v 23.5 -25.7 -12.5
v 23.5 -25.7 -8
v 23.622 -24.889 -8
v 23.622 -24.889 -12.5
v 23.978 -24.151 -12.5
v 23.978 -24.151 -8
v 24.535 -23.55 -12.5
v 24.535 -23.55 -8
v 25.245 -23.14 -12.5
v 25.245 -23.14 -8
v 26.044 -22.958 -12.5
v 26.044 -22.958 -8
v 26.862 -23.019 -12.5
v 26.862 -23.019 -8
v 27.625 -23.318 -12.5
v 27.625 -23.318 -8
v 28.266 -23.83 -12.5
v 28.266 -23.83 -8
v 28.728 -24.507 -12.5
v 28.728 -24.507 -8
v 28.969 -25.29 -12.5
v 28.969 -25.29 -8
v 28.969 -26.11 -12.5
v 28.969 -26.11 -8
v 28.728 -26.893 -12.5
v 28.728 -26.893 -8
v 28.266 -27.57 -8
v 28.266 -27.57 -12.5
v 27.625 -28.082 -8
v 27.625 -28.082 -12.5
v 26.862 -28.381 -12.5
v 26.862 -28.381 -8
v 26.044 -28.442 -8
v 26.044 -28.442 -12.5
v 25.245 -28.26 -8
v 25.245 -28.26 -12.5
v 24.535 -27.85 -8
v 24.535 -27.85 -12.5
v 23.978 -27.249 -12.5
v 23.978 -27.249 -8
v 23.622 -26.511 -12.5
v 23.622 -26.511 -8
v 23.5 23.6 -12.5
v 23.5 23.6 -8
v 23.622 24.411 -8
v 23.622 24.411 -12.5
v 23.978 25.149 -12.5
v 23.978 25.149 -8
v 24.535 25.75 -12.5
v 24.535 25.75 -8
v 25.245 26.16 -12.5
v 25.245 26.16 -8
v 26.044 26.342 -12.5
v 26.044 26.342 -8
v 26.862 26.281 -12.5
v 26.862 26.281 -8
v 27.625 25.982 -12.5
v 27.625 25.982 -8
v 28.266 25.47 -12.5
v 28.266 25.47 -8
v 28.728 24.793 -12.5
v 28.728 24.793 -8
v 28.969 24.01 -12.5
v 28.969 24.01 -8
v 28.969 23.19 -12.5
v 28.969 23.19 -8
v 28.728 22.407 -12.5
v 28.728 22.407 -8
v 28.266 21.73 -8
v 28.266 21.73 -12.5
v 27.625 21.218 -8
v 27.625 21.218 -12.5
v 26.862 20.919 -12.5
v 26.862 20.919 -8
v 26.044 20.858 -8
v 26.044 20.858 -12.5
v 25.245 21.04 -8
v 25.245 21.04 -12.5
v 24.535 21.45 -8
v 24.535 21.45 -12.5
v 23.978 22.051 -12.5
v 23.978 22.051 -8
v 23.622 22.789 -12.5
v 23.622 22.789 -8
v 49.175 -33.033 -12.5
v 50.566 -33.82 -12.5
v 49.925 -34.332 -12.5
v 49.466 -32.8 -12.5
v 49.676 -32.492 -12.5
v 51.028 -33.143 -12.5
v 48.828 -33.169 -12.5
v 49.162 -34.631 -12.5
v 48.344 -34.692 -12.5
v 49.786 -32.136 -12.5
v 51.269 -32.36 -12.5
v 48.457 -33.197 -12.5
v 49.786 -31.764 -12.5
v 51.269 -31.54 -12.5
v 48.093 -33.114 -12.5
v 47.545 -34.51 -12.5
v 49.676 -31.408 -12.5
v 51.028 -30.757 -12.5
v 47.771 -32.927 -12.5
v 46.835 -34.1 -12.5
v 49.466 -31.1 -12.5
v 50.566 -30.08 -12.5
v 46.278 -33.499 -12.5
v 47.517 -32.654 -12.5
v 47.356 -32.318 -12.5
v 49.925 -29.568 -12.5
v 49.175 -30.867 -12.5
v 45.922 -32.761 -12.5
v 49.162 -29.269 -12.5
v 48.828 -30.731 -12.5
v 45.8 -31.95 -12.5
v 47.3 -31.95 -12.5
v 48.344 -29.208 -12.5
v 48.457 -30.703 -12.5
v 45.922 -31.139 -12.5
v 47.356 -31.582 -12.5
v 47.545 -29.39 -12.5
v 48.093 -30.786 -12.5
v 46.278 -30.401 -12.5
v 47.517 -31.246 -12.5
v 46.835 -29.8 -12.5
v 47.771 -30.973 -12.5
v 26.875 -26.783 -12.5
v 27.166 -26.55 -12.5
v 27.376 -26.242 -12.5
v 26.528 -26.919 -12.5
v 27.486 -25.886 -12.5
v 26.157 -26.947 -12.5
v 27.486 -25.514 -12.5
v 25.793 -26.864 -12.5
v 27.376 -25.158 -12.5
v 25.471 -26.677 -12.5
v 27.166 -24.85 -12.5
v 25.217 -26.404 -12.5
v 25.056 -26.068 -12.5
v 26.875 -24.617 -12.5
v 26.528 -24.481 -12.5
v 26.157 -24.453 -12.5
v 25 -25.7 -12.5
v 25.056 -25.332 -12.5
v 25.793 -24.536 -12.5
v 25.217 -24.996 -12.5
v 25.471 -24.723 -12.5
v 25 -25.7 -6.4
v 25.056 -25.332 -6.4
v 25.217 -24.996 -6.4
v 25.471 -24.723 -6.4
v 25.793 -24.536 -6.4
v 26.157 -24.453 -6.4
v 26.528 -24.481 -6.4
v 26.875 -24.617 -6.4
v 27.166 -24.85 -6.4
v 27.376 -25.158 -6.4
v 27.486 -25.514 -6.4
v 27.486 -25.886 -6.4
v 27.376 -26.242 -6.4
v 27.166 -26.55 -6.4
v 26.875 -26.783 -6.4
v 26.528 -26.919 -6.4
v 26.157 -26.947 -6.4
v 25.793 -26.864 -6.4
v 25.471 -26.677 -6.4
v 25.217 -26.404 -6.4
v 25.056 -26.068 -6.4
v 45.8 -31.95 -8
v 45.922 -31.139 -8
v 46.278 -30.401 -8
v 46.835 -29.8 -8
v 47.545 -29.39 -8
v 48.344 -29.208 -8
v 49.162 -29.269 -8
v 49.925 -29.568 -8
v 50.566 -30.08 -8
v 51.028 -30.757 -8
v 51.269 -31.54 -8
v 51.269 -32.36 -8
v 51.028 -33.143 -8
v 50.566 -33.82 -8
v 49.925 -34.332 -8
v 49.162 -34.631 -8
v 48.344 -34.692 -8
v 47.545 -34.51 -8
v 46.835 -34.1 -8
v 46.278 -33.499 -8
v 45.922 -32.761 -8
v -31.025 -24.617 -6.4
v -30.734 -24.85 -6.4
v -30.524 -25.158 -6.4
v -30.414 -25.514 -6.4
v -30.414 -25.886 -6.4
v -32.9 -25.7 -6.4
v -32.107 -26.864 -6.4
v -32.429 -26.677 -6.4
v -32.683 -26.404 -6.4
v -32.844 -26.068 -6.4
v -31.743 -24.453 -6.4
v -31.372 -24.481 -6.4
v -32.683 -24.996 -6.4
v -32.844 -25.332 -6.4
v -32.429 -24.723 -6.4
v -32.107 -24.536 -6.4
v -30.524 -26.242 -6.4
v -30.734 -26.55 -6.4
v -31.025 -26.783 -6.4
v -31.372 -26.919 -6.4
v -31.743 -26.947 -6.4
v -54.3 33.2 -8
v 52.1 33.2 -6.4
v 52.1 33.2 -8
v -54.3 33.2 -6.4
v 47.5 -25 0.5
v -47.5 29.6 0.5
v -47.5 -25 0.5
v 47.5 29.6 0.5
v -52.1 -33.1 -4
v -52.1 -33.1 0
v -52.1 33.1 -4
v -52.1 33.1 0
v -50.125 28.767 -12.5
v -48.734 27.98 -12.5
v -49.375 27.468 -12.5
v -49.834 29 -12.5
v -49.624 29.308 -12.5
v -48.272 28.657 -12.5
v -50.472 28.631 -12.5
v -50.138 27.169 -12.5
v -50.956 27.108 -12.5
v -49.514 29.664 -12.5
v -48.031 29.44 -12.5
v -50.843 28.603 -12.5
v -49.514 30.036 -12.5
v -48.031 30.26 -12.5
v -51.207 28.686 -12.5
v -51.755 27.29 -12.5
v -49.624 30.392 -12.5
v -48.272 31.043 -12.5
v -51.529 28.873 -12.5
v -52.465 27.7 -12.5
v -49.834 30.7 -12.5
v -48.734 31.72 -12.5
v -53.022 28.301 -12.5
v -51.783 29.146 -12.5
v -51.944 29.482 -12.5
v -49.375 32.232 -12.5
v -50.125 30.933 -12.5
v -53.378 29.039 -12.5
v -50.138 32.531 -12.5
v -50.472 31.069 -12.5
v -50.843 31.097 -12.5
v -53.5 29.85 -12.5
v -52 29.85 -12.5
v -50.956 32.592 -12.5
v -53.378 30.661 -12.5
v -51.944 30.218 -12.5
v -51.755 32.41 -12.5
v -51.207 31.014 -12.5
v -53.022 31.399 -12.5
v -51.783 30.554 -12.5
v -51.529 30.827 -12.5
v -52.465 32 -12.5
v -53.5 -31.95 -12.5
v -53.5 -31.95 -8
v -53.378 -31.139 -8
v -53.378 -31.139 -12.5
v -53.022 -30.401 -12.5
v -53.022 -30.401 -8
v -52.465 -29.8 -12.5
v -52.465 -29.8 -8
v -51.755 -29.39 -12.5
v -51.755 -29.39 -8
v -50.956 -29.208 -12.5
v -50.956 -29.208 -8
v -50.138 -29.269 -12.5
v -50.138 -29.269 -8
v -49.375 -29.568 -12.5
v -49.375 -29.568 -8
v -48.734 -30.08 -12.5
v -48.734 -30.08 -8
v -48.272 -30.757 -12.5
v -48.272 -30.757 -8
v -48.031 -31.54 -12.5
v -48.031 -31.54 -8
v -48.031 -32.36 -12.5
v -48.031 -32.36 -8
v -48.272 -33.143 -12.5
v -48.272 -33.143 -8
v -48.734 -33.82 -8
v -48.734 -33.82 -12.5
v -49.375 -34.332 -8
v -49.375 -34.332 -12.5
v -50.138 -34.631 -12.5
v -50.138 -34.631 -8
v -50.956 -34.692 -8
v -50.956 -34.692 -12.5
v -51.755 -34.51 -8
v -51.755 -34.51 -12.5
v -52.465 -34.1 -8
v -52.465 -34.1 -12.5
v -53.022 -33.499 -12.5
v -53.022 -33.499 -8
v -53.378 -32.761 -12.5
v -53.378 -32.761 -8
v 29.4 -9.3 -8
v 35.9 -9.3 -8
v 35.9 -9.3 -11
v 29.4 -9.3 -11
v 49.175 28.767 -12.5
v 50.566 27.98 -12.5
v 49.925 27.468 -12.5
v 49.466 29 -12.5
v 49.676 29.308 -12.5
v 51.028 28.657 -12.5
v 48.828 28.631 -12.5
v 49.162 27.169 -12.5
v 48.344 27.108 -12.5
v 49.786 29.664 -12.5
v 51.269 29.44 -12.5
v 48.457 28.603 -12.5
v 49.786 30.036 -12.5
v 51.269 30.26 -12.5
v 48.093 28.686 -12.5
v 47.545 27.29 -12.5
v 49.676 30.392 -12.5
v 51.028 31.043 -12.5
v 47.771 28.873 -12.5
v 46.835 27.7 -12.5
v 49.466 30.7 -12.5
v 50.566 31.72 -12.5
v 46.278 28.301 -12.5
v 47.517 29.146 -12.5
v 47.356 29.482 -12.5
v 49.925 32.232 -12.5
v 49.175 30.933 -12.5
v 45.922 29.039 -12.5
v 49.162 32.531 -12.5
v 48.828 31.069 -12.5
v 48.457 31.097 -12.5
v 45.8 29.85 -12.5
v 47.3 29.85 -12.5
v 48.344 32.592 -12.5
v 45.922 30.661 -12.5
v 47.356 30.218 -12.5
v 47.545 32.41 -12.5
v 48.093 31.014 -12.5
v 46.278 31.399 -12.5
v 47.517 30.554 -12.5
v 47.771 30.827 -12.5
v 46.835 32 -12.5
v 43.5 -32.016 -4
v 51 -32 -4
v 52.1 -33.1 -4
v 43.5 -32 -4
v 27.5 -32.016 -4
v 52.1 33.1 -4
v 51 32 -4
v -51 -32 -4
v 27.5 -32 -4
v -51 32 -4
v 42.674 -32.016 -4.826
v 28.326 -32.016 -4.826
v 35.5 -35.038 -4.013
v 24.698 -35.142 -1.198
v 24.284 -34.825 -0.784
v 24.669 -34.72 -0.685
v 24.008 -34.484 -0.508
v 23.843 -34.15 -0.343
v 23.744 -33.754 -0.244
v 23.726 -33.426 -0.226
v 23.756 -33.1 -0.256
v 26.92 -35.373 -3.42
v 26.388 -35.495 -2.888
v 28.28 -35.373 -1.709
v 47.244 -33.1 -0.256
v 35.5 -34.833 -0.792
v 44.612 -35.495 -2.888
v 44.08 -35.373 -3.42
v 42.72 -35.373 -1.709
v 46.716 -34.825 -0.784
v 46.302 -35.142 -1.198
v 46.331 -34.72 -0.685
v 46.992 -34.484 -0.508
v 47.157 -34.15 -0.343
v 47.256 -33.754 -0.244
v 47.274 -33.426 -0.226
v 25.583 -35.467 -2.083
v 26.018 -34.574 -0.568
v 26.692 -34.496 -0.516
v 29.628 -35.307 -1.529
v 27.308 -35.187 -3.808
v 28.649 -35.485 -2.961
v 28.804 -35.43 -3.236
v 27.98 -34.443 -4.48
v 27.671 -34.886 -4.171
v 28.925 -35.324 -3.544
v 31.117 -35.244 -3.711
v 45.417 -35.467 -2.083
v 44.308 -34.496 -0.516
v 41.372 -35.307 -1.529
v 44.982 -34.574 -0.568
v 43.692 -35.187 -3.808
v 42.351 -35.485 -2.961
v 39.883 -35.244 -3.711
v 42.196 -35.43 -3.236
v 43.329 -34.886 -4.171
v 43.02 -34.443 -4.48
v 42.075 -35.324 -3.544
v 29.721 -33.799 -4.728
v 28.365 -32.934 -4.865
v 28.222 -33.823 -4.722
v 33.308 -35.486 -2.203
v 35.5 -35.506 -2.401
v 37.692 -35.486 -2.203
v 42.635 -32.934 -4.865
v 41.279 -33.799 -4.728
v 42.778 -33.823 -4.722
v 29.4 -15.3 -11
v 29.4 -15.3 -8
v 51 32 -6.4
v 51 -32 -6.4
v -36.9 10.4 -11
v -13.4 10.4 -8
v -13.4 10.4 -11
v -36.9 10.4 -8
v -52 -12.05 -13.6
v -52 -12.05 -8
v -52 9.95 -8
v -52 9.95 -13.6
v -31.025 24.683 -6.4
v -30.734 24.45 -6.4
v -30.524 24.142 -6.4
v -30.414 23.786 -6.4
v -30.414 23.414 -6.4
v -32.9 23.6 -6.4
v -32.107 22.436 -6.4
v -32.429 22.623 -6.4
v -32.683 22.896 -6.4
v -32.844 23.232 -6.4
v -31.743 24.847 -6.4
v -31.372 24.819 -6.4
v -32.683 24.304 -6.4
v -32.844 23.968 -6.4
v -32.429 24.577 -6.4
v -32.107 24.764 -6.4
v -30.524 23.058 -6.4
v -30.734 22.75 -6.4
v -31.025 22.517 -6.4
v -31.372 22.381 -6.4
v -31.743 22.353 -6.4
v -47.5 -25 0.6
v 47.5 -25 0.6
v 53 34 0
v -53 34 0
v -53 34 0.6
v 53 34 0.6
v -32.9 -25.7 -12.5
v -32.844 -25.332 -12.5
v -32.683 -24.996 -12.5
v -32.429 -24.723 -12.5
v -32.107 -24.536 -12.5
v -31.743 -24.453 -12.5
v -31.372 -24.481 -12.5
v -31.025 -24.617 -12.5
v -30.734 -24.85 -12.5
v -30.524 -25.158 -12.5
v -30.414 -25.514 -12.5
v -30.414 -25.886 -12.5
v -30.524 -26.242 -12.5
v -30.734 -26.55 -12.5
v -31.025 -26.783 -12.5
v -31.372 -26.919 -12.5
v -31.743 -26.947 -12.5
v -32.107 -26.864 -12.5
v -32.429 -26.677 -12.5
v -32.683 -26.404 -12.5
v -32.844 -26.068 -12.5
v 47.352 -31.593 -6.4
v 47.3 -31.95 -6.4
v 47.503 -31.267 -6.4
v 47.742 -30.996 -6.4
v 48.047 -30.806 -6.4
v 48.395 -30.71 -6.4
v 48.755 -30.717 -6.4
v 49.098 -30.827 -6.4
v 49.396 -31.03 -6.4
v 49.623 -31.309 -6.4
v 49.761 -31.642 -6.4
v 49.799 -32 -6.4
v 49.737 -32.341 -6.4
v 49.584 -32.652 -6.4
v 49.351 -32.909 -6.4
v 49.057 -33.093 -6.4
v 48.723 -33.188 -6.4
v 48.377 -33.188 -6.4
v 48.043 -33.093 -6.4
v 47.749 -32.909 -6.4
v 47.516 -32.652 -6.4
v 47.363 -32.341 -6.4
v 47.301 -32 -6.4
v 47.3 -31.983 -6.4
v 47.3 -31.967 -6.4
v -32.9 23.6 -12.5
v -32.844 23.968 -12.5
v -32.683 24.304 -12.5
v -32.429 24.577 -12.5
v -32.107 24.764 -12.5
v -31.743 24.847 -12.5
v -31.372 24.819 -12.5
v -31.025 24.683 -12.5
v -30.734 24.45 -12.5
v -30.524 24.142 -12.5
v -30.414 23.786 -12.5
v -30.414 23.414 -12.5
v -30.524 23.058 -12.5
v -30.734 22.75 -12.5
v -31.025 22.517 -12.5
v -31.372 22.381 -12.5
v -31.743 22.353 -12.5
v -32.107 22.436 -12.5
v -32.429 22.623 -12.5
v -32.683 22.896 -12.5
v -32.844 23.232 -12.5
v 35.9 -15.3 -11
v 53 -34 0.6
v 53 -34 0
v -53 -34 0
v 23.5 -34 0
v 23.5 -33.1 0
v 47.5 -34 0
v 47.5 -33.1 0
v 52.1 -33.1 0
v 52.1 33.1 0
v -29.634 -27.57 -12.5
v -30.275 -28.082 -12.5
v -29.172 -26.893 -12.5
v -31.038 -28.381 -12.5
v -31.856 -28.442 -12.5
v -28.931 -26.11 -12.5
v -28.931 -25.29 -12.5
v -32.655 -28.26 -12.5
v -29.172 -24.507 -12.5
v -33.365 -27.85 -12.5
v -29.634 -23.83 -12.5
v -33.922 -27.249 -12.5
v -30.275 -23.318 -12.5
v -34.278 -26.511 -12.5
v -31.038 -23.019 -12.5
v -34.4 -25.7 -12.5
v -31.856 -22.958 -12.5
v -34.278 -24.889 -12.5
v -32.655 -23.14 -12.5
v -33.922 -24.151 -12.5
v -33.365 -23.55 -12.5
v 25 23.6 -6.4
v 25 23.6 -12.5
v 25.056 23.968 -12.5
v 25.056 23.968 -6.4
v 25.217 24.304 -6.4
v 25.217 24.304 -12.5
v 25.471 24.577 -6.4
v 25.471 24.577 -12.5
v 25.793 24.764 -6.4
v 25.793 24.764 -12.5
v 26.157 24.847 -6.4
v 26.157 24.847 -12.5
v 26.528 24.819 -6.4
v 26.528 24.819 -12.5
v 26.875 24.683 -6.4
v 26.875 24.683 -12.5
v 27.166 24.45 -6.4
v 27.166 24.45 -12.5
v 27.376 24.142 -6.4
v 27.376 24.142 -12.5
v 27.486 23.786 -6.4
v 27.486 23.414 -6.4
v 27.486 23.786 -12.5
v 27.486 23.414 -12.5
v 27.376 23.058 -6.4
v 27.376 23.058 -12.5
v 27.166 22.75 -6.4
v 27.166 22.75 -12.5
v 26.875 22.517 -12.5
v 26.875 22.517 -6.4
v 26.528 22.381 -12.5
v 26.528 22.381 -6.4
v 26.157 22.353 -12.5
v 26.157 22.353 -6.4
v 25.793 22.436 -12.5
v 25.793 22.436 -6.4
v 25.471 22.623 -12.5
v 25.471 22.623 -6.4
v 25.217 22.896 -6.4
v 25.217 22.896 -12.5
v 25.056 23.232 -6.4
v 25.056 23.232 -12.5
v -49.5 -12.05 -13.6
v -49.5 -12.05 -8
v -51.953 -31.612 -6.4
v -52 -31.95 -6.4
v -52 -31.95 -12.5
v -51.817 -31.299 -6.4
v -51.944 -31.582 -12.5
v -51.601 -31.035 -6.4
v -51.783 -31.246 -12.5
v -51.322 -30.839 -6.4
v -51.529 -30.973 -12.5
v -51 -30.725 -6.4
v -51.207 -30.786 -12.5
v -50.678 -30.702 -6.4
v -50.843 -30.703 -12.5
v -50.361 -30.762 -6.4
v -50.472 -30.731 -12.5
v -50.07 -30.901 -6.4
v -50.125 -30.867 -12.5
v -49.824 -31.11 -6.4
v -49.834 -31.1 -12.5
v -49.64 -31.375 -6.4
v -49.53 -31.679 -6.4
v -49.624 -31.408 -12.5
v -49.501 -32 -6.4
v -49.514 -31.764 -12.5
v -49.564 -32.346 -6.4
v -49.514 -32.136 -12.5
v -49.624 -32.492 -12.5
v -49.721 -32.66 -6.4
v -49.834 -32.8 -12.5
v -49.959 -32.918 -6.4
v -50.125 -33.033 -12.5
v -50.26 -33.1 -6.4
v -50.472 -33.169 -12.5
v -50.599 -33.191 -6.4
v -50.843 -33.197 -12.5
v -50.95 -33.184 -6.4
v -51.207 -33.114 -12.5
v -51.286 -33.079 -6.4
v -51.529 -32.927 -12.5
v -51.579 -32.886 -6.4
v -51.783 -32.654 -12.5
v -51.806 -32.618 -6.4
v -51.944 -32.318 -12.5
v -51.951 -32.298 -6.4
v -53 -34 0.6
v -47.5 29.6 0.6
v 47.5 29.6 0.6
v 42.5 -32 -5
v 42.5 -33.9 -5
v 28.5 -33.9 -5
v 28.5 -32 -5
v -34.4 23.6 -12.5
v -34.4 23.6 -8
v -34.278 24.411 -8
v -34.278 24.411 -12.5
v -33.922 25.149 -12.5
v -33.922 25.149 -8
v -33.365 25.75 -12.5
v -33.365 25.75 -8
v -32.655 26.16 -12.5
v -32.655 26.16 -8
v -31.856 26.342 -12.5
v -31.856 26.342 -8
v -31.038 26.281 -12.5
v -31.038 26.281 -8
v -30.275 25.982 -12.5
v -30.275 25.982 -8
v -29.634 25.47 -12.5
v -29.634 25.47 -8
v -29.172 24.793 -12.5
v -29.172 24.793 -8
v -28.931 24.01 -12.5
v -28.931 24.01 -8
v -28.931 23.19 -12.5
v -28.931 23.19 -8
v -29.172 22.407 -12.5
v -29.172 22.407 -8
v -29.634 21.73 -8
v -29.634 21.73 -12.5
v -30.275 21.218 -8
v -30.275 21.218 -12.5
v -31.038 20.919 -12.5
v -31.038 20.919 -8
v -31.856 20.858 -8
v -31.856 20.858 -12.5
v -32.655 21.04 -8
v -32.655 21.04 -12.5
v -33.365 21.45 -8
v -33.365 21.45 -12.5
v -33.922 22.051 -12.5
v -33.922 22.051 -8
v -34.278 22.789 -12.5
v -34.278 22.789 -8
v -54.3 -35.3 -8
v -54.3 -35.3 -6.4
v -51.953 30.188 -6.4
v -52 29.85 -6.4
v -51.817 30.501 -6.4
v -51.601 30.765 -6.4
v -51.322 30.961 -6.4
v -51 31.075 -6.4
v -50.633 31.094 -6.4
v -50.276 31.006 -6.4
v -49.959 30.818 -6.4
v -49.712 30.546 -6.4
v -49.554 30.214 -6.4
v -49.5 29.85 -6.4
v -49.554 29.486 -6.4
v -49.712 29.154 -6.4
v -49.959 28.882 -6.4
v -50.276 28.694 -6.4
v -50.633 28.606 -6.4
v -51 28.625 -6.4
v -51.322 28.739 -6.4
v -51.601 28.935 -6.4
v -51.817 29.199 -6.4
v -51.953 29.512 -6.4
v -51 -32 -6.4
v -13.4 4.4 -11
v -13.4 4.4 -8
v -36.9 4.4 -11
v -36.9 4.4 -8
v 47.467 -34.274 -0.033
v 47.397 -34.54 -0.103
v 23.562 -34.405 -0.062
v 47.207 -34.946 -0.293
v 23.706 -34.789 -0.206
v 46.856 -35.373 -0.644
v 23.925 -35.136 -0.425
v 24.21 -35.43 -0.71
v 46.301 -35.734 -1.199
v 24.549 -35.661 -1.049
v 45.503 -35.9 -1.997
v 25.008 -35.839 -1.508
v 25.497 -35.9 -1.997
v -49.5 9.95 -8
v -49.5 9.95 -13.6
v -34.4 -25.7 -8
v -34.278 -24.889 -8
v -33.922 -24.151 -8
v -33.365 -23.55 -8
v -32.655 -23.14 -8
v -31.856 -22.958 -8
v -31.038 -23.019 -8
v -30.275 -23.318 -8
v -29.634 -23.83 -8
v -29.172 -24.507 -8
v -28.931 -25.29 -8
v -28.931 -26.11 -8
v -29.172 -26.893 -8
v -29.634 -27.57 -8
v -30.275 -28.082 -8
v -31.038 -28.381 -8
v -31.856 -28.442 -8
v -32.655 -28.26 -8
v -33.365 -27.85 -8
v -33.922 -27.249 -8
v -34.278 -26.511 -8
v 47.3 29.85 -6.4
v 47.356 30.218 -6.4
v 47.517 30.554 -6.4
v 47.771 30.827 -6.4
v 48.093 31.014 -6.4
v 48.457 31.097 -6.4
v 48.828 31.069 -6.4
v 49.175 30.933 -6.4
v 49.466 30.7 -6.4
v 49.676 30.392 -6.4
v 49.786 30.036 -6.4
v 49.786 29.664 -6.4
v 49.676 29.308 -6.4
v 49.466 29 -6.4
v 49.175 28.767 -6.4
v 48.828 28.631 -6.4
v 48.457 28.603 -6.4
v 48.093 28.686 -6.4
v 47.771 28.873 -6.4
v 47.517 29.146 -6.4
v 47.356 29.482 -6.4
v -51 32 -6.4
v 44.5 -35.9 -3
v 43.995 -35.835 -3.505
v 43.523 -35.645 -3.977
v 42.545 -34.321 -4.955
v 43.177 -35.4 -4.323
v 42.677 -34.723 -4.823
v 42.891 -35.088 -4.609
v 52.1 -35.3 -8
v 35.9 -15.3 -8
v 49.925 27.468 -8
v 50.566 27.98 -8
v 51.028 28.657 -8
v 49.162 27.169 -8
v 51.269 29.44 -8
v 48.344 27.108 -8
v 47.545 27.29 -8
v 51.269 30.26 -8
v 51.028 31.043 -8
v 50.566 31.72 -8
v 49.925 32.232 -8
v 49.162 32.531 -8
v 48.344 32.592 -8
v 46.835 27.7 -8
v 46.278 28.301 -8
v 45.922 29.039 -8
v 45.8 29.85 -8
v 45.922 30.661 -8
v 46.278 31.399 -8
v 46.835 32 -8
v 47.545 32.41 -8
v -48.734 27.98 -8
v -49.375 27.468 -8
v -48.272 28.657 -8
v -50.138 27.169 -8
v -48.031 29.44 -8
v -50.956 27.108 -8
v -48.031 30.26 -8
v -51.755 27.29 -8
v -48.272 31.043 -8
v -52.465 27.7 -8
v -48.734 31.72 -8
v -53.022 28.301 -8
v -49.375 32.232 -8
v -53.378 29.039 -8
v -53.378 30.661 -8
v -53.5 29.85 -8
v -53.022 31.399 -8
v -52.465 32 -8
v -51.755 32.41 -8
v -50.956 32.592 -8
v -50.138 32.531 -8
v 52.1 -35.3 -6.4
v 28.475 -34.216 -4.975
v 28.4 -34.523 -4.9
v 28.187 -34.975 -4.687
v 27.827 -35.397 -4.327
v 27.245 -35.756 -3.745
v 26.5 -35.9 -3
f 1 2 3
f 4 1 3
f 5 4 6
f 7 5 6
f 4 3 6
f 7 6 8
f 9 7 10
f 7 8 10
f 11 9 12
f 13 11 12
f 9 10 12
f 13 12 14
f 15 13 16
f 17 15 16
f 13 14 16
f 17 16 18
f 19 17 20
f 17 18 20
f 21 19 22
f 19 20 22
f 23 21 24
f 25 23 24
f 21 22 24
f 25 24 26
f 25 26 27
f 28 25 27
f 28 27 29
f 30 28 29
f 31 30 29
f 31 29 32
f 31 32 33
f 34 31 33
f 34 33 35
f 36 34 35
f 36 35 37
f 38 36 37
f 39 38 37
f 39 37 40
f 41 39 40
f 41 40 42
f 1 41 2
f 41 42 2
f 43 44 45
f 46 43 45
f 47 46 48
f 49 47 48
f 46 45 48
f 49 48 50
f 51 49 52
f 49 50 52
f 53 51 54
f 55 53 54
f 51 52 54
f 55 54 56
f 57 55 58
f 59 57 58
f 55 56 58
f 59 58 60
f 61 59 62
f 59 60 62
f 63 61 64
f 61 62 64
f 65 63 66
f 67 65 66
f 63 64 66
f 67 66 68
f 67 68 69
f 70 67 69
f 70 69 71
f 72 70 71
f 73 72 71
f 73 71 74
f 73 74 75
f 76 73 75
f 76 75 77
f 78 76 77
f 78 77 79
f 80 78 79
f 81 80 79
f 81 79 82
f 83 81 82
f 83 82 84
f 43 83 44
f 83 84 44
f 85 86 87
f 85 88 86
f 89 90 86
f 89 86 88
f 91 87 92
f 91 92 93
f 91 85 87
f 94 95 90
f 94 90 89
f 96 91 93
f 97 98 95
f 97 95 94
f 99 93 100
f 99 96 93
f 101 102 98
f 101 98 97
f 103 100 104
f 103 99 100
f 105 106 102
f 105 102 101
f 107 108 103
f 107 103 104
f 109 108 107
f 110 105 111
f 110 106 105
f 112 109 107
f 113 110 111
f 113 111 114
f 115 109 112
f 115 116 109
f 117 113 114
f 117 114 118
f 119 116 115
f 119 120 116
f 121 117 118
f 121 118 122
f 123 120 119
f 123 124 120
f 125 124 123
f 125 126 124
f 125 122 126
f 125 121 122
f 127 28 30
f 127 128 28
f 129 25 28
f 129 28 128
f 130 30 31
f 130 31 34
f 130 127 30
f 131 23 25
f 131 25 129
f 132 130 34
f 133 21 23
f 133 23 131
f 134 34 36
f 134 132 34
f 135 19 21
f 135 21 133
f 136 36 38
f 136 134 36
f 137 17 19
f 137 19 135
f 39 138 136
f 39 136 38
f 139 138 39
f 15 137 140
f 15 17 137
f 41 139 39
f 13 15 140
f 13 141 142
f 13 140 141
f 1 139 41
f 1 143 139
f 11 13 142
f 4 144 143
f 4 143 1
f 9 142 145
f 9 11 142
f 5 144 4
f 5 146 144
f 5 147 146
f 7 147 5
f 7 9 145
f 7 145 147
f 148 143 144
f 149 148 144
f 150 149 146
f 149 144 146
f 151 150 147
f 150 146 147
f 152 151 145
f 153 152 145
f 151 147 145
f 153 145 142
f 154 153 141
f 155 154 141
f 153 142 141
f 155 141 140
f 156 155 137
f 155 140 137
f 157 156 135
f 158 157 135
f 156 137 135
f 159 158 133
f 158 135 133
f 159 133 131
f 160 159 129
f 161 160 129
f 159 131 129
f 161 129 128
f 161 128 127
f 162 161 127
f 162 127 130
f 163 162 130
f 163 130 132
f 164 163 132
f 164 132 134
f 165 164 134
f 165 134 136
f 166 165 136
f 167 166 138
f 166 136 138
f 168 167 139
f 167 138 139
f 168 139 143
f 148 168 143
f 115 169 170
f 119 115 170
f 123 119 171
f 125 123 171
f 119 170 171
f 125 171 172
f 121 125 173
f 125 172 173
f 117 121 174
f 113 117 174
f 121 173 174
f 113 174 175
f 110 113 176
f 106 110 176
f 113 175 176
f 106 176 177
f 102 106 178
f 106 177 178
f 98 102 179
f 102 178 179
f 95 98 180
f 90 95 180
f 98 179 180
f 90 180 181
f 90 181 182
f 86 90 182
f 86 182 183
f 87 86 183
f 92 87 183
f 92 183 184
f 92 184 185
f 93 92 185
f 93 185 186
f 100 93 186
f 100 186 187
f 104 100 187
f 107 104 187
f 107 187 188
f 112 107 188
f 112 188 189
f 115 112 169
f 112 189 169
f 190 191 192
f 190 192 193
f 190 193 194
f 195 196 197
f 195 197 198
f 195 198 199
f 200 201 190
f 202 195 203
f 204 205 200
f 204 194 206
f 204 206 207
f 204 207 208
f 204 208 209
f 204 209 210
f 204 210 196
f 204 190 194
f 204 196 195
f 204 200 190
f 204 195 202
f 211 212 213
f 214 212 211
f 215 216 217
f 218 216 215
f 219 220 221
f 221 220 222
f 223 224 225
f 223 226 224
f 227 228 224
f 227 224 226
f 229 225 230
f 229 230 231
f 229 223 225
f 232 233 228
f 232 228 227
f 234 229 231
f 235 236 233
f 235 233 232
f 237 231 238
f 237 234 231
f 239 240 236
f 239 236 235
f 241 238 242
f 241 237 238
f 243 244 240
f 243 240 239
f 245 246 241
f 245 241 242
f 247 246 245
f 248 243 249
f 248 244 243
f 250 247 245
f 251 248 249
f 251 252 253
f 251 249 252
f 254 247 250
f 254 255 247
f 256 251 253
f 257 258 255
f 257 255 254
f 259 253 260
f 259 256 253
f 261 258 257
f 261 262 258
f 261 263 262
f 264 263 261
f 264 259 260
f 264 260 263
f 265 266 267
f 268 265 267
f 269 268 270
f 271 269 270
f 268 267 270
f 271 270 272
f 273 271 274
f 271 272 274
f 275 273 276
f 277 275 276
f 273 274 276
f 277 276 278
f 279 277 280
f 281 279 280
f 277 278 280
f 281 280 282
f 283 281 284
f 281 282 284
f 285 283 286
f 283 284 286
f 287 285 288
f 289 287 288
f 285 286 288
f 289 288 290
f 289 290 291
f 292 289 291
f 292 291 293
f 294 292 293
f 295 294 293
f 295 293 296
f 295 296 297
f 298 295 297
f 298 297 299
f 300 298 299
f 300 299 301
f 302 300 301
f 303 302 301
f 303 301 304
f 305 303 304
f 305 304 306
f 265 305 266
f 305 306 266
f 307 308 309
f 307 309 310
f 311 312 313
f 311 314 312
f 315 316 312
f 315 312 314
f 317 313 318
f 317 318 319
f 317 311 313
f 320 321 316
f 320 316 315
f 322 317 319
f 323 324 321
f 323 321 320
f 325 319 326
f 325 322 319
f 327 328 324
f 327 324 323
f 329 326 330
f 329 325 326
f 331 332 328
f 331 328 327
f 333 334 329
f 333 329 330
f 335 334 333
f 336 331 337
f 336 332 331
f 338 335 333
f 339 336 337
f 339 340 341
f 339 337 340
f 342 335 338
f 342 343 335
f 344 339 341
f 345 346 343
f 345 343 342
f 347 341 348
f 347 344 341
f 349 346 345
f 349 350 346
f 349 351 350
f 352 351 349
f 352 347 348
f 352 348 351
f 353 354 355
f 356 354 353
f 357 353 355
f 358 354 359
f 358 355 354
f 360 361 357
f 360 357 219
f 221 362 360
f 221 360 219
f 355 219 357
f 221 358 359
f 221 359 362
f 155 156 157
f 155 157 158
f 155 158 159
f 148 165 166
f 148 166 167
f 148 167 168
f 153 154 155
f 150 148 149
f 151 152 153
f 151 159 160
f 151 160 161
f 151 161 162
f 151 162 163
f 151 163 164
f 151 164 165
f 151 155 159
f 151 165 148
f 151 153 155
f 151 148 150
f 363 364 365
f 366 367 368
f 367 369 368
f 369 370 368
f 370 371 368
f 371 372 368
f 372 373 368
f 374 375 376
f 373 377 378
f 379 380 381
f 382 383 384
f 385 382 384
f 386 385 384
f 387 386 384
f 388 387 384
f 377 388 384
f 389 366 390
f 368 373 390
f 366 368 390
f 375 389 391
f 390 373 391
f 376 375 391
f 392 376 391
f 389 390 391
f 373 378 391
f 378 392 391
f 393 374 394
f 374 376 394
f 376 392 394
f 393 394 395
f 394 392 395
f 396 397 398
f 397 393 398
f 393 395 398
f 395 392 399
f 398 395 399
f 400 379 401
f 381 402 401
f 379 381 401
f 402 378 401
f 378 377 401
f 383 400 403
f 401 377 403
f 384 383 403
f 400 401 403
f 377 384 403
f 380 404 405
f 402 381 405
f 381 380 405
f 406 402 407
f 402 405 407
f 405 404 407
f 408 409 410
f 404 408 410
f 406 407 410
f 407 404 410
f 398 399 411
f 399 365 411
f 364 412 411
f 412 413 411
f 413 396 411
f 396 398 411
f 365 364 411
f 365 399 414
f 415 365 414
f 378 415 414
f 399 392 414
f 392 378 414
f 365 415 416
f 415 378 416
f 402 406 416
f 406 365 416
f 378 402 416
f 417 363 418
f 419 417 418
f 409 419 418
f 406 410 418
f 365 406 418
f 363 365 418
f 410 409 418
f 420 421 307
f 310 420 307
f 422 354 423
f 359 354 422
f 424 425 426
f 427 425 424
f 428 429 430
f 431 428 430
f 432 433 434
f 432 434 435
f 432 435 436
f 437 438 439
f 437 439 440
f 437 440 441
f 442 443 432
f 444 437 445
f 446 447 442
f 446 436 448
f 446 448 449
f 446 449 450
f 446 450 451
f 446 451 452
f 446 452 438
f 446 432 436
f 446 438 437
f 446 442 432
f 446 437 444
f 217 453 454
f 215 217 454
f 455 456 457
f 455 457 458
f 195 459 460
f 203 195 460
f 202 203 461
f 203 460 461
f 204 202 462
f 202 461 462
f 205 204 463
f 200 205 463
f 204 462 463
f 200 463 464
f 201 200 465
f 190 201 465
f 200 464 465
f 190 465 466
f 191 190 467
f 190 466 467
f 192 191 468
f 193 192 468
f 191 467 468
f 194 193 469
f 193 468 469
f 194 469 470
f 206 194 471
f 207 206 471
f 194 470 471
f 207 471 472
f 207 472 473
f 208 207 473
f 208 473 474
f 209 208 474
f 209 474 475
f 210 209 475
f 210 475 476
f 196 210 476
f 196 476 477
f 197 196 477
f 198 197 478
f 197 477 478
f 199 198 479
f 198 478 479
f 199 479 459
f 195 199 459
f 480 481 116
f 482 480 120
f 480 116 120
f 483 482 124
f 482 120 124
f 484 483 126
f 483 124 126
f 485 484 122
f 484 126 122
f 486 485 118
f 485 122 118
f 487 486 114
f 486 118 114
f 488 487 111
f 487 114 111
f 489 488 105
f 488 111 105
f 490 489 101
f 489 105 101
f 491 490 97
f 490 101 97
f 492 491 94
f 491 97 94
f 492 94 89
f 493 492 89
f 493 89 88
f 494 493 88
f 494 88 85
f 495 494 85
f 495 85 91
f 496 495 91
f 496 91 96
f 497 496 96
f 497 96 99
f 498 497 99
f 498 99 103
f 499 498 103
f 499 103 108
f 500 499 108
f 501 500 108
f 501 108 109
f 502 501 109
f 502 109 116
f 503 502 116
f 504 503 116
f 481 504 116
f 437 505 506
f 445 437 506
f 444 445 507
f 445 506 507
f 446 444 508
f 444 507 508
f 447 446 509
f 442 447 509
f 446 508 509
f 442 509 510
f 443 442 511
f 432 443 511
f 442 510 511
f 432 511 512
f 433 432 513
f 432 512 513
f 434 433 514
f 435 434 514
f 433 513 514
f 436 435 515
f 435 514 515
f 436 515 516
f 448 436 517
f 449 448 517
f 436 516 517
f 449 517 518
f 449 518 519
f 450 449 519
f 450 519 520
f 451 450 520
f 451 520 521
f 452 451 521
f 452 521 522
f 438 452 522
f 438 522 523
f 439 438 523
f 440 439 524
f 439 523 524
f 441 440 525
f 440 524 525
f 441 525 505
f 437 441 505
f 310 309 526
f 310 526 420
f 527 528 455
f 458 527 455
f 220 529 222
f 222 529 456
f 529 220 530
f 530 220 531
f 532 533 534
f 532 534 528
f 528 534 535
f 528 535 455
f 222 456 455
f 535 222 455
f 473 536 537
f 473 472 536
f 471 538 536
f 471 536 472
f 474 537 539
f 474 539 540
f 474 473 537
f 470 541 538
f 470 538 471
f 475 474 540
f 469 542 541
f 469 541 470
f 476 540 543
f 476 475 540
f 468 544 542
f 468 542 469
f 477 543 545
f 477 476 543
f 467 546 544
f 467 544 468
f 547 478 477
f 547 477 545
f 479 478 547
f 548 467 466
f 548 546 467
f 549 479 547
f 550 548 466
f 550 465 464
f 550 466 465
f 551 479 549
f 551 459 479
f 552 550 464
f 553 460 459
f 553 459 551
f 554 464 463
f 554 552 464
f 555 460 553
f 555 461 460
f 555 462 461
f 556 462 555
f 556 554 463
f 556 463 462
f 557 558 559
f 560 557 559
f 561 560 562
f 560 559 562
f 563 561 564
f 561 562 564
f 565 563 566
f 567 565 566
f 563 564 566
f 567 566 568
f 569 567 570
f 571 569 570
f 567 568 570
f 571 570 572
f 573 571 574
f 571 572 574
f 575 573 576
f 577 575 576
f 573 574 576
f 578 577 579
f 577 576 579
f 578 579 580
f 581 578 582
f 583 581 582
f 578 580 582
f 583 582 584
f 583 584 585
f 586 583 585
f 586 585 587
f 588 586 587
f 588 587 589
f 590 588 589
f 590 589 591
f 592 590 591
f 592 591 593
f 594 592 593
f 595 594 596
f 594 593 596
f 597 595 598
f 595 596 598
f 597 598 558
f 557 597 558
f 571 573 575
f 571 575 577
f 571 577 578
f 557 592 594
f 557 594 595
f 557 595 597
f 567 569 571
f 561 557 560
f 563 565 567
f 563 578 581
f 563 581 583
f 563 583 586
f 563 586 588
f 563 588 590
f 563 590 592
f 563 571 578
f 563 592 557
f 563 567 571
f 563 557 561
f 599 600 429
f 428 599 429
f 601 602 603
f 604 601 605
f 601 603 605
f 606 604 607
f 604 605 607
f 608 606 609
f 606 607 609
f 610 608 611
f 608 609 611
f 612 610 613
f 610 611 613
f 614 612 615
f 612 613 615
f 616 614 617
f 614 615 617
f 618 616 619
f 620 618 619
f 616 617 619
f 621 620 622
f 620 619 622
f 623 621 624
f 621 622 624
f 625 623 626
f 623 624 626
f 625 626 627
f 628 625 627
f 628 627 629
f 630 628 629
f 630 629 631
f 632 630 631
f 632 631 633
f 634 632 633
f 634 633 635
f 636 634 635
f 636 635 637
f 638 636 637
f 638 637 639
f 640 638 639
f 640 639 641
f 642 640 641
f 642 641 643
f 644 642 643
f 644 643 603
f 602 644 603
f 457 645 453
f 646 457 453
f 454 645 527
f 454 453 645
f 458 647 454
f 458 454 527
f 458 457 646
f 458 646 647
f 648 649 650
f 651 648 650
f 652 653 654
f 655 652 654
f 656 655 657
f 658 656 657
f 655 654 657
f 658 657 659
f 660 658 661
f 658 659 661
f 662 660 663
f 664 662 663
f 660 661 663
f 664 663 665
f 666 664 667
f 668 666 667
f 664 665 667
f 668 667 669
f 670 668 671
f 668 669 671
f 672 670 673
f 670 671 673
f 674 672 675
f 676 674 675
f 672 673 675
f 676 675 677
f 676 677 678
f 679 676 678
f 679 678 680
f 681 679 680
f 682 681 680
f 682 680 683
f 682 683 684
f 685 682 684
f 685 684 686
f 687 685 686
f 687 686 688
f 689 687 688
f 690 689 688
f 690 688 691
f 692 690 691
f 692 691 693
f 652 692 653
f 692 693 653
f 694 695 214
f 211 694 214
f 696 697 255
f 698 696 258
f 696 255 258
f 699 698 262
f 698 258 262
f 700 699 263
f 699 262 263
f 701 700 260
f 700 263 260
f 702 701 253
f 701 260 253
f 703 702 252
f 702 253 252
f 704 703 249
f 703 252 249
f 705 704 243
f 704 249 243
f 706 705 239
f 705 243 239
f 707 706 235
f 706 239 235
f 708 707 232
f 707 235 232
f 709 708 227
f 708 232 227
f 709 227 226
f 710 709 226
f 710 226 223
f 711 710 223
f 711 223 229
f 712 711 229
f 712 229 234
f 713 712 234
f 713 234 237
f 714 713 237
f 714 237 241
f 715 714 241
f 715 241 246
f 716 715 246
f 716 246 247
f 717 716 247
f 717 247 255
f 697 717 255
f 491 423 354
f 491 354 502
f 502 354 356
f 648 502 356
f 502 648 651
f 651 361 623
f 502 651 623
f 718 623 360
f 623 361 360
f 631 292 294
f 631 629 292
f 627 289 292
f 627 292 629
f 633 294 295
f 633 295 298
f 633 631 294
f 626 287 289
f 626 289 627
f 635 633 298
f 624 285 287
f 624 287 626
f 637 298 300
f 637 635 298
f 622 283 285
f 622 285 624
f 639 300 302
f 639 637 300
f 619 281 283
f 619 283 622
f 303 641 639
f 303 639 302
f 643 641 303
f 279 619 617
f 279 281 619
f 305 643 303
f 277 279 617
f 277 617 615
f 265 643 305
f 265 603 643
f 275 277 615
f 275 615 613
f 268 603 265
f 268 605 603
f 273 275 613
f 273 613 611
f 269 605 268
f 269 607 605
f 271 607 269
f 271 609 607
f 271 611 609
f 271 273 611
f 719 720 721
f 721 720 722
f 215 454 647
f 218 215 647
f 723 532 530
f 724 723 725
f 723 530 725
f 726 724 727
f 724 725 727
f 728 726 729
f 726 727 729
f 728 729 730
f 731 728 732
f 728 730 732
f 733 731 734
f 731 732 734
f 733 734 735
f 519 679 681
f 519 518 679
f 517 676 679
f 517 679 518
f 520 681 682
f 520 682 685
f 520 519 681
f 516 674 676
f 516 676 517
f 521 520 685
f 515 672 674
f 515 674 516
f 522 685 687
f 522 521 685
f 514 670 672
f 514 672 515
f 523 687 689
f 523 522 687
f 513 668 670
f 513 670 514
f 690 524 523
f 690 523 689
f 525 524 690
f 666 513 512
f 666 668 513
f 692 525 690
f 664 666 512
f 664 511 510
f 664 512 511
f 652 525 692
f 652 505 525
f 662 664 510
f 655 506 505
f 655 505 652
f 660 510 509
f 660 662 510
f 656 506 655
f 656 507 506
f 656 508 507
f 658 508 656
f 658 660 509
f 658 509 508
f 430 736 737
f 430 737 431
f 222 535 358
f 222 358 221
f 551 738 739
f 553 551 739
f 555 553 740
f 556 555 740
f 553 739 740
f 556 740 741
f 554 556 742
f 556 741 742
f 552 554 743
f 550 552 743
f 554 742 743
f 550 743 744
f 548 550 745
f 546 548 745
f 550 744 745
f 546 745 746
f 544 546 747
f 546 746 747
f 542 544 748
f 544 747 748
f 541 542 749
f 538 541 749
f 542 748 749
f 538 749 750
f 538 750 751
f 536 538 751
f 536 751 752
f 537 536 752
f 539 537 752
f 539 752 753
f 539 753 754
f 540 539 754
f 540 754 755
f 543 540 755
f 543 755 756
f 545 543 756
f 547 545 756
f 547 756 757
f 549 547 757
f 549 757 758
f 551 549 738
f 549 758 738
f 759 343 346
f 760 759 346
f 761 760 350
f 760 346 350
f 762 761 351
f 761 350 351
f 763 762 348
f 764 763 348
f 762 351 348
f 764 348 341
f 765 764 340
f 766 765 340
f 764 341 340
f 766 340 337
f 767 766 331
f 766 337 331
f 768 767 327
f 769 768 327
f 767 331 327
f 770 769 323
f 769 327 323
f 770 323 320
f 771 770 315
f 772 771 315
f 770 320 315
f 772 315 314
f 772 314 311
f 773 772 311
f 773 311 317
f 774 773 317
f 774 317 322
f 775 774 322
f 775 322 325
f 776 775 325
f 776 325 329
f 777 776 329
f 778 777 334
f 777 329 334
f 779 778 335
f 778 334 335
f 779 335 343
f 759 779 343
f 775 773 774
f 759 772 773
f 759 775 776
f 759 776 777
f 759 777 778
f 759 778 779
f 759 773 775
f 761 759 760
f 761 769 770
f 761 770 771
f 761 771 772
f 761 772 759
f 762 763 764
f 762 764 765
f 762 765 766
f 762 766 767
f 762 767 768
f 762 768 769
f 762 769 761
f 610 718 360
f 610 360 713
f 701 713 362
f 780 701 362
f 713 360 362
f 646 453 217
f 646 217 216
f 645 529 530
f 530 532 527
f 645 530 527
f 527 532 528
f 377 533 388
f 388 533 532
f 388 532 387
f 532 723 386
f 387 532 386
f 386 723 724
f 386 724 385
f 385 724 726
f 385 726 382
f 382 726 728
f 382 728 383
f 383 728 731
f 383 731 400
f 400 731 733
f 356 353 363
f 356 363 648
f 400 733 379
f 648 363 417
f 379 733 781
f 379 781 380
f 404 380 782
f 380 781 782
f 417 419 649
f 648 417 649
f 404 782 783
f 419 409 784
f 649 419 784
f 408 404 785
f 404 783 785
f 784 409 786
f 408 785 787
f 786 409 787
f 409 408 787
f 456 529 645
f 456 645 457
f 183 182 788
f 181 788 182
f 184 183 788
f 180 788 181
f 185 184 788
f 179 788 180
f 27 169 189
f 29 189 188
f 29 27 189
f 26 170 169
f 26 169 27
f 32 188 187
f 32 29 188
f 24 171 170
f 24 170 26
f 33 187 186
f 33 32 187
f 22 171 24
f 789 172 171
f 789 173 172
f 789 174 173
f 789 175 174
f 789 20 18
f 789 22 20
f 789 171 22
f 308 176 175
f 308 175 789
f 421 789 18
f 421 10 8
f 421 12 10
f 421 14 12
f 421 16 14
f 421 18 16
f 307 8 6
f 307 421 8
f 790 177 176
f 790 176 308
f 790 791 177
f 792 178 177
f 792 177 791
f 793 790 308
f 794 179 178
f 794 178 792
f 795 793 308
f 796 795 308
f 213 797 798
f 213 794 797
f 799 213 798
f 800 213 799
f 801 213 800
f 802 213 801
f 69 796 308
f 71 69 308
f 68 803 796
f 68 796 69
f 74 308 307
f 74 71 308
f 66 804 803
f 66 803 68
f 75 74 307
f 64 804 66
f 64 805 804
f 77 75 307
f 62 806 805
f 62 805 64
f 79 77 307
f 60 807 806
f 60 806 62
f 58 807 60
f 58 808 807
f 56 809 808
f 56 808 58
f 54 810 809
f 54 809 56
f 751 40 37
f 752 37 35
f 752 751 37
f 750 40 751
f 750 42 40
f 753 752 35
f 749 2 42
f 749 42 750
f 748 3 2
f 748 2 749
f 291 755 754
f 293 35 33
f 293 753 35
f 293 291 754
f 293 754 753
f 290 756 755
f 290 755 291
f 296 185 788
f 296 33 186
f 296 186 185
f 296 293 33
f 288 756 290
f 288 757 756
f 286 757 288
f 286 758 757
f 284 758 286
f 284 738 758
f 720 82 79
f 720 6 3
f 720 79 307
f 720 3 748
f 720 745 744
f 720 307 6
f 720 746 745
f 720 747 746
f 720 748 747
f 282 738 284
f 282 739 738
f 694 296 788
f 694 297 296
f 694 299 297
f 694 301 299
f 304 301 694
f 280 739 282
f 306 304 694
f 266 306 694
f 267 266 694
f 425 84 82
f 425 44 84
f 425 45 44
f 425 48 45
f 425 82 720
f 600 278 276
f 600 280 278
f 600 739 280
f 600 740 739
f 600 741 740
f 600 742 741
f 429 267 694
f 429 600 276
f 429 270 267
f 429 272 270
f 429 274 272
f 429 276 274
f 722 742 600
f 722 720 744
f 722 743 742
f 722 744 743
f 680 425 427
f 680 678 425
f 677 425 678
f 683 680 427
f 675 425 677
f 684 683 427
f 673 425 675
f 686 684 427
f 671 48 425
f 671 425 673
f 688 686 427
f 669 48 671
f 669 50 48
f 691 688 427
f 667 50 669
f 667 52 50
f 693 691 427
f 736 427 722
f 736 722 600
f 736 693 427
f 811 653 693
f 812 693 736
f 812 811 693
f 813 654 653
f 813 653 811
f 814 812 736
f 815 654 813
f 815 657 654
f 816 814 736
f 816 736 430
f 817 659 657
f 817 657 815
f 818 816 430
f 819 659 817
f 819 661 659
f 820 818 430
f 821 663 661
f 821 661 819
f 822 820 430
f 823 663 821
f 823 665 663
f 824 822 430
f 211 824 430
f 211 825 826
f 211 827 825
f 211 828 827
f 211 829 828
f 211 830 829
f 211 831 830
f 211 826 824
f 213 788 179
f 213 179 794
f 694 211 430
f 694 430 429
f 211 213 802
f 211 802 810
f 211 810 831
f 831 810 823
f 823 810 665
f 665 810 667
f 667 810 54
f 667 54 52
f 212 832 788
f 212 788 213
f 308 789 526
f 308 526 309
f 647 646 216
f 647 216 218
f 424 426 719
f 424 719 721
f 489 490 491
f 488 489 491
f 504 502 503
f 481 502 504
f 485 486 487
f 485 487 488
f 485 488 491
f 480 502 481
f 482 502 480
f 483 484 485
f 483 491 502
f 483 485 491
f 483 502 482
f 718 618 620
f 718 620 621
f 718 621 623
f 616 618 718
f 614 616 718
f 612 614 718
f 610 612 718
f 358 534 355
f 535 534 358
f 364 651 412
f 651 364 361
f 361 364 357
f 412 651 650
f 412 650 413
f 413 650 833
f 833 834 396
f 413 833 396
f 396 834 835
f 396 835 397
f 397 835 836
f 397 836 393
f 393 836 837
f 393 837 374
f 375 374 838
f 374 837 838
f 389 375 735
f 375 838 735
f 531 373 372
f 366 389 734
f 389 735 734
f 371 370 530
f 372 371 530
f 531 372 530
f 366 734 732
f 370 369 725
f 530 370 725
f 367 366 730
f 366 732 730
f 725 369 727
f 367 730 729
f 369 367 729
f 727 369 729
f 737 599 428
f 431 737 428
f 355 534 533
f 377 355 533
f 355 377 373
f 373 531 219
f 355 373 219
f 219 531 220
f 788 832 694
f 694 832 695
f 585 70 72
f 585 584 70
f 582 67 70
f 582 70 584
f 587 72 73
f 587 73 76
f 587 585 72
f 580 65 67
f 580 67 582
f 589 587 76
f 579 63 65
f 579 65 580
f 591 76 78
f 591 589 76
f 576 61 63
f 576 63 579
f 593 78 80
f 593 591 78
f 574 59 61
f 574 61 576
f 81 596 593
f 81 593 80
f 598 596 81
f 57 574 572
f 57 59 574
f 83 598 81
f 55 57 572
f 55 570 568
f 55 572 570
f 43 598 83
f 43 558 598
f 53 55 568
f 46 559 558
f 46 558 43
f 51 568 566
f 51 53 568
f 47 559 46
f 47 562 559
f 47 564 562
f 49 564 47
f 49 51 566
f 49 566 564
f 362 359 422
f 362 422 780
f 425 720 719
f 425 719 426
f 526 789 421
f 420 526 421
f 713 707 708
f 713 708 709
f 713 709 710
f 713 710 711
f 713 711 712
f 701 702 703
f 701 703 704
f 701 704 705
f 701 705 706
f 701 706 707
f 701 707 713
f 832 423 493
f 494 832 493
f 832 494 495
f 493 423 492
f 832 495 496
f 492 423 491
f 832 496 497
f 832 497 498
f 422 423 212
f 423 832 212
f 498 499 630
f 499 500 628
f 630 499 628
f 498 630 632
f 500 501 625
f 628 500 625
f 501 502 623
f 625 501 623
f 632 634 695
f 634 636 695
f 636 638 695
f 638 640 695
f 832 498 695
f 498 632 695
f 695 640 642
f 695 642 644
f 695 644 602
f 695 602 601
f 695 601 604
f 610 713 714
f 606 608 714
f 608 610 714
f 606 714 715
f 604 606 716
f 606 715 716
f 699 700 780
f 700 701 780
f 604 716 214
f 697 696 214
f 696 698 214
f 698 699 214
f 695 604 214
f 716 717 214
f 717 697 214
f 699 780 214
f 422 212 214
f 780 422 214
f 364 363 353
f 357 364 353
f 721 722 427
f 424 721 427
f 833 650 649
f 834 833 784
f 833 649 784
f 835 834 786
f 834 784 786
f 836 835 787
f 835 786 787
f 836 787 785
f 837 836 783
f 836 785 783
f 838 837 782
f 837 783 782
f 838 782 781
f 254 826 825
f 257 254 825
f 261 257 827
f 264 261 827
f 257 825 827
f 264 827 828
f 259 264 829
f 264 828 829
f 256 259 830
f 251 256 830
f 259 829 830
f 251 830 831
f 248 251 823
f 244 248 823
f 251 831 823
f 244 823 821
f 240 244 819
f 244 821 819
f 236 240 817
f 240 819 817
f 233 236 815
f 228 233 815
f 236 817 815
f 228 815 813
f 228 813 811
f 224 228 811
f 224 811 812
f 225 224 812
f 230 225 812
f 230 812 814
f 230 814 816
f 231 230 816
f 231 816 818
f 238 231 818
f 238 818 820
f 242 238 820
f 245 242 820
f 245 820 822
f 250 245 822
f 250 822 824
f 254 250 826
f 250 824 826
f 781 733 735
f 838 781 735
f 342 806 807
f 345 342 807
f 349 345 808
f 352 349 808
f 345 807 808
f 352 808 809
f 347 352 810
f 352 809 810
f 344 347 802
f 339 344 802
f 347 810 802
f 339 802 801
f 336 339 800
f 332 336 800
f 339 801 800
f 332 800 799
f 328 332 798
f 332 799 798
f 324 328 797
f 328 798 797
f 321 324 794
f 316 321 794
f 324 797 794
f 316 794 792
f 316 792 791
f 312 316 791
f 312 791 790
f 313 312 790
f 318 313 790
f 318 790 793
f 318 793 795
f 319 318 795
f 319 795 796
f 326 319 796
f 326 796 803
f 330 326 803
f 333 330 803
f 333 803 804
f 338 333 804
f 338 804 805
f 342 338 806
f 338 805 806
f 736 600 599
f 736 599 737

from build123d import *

# Parameters (mm, degrees)
SKETCH1_W                       = 106
SKETCH1_H                       = 68
BOSS_EXTRUDE1_DEPTH             = 0.6
SKETCH2_W                       = 95
SKETCH2_H                       = 54.6
CUT_EXTRUDE1_DEPTH              = 0.1
SKETCH4_W                       = 104.2
SKETCH4_H                       = 66.2
BOSS_EXTRUDE2_DEPTH             = 4
SKETCH5_W                       = 102
SKETCH5_H                       = 64
BOSS_EXTRUDE3_DEPTH             = 2.4
SKETCH6_W                       = 106.4
SKETCH6_H                       = 68.5
BOSS_EXTRUDE4_DEPTH             = 1.6
BOSS_EXTRUDE5_DEPTH             = 2.8
BOSS_EXTRUDE5_DIRECTION_2_REACH = 88.689
FILLET1_R                       = 2
CUT_EXTRUDE2_REACH              = 114.578
SKETCH9_R                       = 2.75
BOSS_EXTRUDE6_DEPTH             = 4.5
SKETCH10_R                      = 1.25
CUT_EXTRUDE3_DEPTH              = 6.1
SKETCH11_W                      = 2.5
SKETCH11_H                      = 22
BOSS_EXTRUDE7_DEPTH             = 5.6
SKETCH12_W                      = 23.5
SKETCH12_H                      = 6
SKETCH12_W_2                    = 6.5
BOSS_EXTRUDE8_DEPTH             = 3


with BuildPart() as part:
    # Sketch1 → Boss-Extrude1 (new body)
    with BuildSketch(Plane.XY):
        Rectangle(SKETCH1_W, SKETCH1_H)
    extrude(amount=BOSS_EXTRUDE1_DEPTH)

    # Sketch2 → Cut-Extrude1 (cut)
    with BuildSketch(Plane.XY.offset(0.6)):
        with Locations((0, 2.3)):
            Rectangle(SKETCH2_W, SKETCH2_H)
    extrude(amount=-CUT_EXTRUDE1_DEPTH, mode=Mode.SUBTRACT)

    # Sketch4 → Boss-Extrude2 (add)
    with BuildSketch(Plane(origin=(0, 0, 0), x_dir=(-1, 0, 0), z_dir=(0, 0, -1))):
        Rectangle(SKETCH4_W, SKETCH4_H)
    extrude(amount=BOSS_EXTRUDE2_DEPTH)

    # Sketch5 → Boss-Extrude3 (add)
    with BuildSketch(Plane(origin=(0, 0, -4), x_dir=(-1, 0, 0), z_dir=(0, 0, -1))):
        Rectangle(SKETCH5_W, SKETCH5_H)
    extrude(amount=BOSS_EXTRUDE3_DEPTH)

    # Sketch6 → Boss-Extrude4 (add)
    with BuildSketch(Plane(origin=(0, 0, -6.4), x_dir=(-1, 0, 0), z_dir=(0, 0, -1))):
        with Locations((1.1, -1.05)):
            Rectangle(SKETCH6_W, SKETCH6_H)
    extrude(amount=BOSS_EXTRUDE4_DEPTH)

    # Sketch7 → Boss-Extrude5 (add)
    with BuildSketch(Plane.XZ.offset(33.1)):
        Polygon((47.5, 0), (42.5, -5), (28.5, -5), (23.5, 0), align=None)
    extrude(amount=BOSS_EXTRUDE5_DEPTH)

    # Boss-Extrude5 direction 2: up to this face of the body (flat: up to its plane)
    boss_extrude5_direction_2_end = Plane(part.part.faces().sort_by_distance((0, -32, -5.2))[0])
    # Sketch7 → Boss-Extrude5 direction 2 (add, up to the picked face)
    with BuildSketch(Plane.XZ.offset(33.1), mode=Mode.PRIVATE) as boss_extrude5_direction_2_sk1:
        Polygon((47.5, 0), (42.5, -5), (28.5, -5), (23.5, 0), align=None)
    boss_extrude5_direction_2_tool1 = split(extrude(boss_extrude5_direction_2_sk1.sketch, amount=-BOSS_EXTRUDE5_DIRECTION_2_REACH, mode=Mode.PRIVATE), bisect_by=boss_extrude5_direction_2_end, keep=Keep.BOTH, mode=Mode.PRIVATE)
    add(boss_extrude5_direction_2_tool1.solids().sort_by(Axis((35.5, -33.1, -2.280702), (0, 1, 0)))[0])

    # Fillet1
    # the kernel refuses this fillet: 2 mm, written as the material it takes off along each edge
    with BuildSketch(Plane(origin=(18.506253911, -35.9, 0), x_dir=(0, 1, 0), z_dir=(1, 0, 0))) as fillet1_piece_1:
        with BuildLine():
            CenterArc((2, -1.997498436), FILLET1_R, 92.865983983, 87.134016017)
            Line((0, -1.997498436), (-0.04, -1.997498436))
            Line((-0.04, -1.997498436), (-0.04, 0))
            Line((-0.04, 0), (0, 0.04))
            ThreePointArc((0, 0.04), (0.95, 0.04), (1.898, 0.039949969))
            Line((1.898, 0.039949969), (1.9, 0))
        make_face()
    extrude(amount=33.987492178, mode=Mode.SUBTRACT)
    with BuildSketch(Plane(origin=(47.5, -35.9, -5), x_dir=(0, 0, 1), z_dir=(-1, 0, 0))) as fillet1_piece_2:
        with BuildLine():
            CenterArc((FILLET1_R, FILLET1_R), FILLET1_R, 180, 90)
            Line((0, FILLET1_R), (-FILLET1_R * 0.02, FILLET1_R))
            Line((-FILLET1_R * 0.02, FILLET1_R), (-FILLET1_R * 0.02, -FILLET1_R * 0.02))
            Line((-FILLET1_R * 0.02, -FILLET1_R * 0.02), (FILLET1_R, -FILLET1_R * 0.02))
            Line((FILLET1_R, -FILLET1_R * 0.02), (FILLET1_R, 0))
        make_face()
    extrude(amount=24, mode=Mode.SUBTRACT)

    # Cut-Extrude2: up to this plane
    cut_extrude2_end = Plane(origin=(28.5, -7.484698656, -5), z_dir=(-0.7071067811865419, 0, -0.7071067811865531))
    # Sketch8 → Cut-Extrude2 (cut, up to the surface)
    with BuildSketch(Plane(origin=(52.1, 0, 0), x_dir=(0, 0, -1), z_dir=(1, 0, 0)), mode=Mode.PRIVATE) as cut_extrude2_sk1:
        with BuildLine():
            Line((4.825635078, -32.015779283), (4, -32.015779283))
            Line((4, -32.015779283), (4, -33.1))
            Line((4, -33.1), (0.255629625, -33.1))
            add(Edge.make_bspline(
                [(0.255629625, -33.1), (-0.100580752, -35.335403533), (4.586512434, -36.596617464), (4.967609775, -32.916750312), (4.825635078, -32.015779283)],
                knots=[0, 0, 0, 0, 0.609319743, 1, 1, 1, 1], degree=3))
        make_face()
    cut_extrude2_tool1 = split(extrude(cut_extrude2_sk1.sketch, amount=-CUT_EXTRUDE2_REACH, mode=Mode.PRIVATE), bisect_by=cut_extrude2_end, keep=Keep.BOTH, mode=Mode.PRIVATE)
    add(cut_extrude2_tool1.solids().sort_by_distance((52.1, -33.994656, -2.685344))[0], mode=Mode.SUBTRACT)

    # Sketch9 → Boss-Extrude6 (add)
    with BuildSketch(Plane(origin=(0, 0, -8), x_dir=(-1, 0, 0), z_dir=(0, 0, -1))):
        with Locations((-48.55, 29.85)):
            Circle(SKETCH9_R)
        with Locations((-48.55, -31.95)):
            Circle(SKETCH9_R)
        with Locations((50.75, 29.85)):
            Circle(SKETCH9_R)
        with Locations((50.75, -31.95)):
            Circle(SKETCH9_R)
        with Locations((-26.25, 23.6)):
            Circle(SKETCH9_R)
        with Locations((-26.25, -25.7)):
            Circle(SKETCH9_R)
        with Locations((31.65, 23.6)):
            Circle(SKETCH9_R)
        with Locations((31.65, -25.7)):
            Circle(SKETCH9_R)
    extrude(amount=BOSS_EXTRUDE6_DEPTH)

    # Sketch10 → Cut-Extrude3 (cut)
    with BuildSketch(Plane(origin=(0, 0, -12.5), x_dir=(-1, 0, 0), z_dir=(0, 0, -1))):
        with Locations((-48.55, 29.85)):
            Circle(SKETCH10_R)
        with Locations((-26.25, 23.6)):
            Circle(SKETCH10_R)
        with Locations((31.65, 23.6)):
            Circle(SKETCH10_R)
        with Locations((50.75, 29.85)):
            Circle(SKETCH10_R)
        with Locations((-26.25, -25.7)):
            Circle(SKETCH10_R)
        with Locations((-48.55, -31.95)):
            Circle(SKETCH10_R)
        with Locations((50.75, -31.95)):
            Circle(SKETCH10_R)
        with Locations((31.65, -25.7)):
            Circle(SKETCH10_R)
    extrude(amount=-CUT_EXTRUDE3_DEPTH, mode=Mode.SUBTRACT)

    # Sketch11 → Boss-Extrude7 (add)
    with BuildSketch(Plane(origin=(0, 0, -8), x_dir=(-1, 0, 0), z_dir=(0, 0, -1))):
        with Locations((50.75, -1.05)):
            Rectangle(SKETCH11_W, SKETCH11_H)
    extrude(amount=BOSS_EXTRUDE7_DEPTH)

    # Sketch12 → Boss-Extrude8 (add)
    with BuildSketch(Plane(origin=(0, 0, -8), x_dir=(-1, 0, 0), z_dir=(0, 0, -1))):
        with Locations((25.15, 7.4)):
            Rectangle(SKETCH12_W, SKETCH12_H)
        with Locations((-32.65, -12.3)):
            Rectangle(SKETCH12_W_2, SKETCH12_H)
    extrude(amount=BOSS_EXTRUDE8_DEPTH)


solid = part.part
